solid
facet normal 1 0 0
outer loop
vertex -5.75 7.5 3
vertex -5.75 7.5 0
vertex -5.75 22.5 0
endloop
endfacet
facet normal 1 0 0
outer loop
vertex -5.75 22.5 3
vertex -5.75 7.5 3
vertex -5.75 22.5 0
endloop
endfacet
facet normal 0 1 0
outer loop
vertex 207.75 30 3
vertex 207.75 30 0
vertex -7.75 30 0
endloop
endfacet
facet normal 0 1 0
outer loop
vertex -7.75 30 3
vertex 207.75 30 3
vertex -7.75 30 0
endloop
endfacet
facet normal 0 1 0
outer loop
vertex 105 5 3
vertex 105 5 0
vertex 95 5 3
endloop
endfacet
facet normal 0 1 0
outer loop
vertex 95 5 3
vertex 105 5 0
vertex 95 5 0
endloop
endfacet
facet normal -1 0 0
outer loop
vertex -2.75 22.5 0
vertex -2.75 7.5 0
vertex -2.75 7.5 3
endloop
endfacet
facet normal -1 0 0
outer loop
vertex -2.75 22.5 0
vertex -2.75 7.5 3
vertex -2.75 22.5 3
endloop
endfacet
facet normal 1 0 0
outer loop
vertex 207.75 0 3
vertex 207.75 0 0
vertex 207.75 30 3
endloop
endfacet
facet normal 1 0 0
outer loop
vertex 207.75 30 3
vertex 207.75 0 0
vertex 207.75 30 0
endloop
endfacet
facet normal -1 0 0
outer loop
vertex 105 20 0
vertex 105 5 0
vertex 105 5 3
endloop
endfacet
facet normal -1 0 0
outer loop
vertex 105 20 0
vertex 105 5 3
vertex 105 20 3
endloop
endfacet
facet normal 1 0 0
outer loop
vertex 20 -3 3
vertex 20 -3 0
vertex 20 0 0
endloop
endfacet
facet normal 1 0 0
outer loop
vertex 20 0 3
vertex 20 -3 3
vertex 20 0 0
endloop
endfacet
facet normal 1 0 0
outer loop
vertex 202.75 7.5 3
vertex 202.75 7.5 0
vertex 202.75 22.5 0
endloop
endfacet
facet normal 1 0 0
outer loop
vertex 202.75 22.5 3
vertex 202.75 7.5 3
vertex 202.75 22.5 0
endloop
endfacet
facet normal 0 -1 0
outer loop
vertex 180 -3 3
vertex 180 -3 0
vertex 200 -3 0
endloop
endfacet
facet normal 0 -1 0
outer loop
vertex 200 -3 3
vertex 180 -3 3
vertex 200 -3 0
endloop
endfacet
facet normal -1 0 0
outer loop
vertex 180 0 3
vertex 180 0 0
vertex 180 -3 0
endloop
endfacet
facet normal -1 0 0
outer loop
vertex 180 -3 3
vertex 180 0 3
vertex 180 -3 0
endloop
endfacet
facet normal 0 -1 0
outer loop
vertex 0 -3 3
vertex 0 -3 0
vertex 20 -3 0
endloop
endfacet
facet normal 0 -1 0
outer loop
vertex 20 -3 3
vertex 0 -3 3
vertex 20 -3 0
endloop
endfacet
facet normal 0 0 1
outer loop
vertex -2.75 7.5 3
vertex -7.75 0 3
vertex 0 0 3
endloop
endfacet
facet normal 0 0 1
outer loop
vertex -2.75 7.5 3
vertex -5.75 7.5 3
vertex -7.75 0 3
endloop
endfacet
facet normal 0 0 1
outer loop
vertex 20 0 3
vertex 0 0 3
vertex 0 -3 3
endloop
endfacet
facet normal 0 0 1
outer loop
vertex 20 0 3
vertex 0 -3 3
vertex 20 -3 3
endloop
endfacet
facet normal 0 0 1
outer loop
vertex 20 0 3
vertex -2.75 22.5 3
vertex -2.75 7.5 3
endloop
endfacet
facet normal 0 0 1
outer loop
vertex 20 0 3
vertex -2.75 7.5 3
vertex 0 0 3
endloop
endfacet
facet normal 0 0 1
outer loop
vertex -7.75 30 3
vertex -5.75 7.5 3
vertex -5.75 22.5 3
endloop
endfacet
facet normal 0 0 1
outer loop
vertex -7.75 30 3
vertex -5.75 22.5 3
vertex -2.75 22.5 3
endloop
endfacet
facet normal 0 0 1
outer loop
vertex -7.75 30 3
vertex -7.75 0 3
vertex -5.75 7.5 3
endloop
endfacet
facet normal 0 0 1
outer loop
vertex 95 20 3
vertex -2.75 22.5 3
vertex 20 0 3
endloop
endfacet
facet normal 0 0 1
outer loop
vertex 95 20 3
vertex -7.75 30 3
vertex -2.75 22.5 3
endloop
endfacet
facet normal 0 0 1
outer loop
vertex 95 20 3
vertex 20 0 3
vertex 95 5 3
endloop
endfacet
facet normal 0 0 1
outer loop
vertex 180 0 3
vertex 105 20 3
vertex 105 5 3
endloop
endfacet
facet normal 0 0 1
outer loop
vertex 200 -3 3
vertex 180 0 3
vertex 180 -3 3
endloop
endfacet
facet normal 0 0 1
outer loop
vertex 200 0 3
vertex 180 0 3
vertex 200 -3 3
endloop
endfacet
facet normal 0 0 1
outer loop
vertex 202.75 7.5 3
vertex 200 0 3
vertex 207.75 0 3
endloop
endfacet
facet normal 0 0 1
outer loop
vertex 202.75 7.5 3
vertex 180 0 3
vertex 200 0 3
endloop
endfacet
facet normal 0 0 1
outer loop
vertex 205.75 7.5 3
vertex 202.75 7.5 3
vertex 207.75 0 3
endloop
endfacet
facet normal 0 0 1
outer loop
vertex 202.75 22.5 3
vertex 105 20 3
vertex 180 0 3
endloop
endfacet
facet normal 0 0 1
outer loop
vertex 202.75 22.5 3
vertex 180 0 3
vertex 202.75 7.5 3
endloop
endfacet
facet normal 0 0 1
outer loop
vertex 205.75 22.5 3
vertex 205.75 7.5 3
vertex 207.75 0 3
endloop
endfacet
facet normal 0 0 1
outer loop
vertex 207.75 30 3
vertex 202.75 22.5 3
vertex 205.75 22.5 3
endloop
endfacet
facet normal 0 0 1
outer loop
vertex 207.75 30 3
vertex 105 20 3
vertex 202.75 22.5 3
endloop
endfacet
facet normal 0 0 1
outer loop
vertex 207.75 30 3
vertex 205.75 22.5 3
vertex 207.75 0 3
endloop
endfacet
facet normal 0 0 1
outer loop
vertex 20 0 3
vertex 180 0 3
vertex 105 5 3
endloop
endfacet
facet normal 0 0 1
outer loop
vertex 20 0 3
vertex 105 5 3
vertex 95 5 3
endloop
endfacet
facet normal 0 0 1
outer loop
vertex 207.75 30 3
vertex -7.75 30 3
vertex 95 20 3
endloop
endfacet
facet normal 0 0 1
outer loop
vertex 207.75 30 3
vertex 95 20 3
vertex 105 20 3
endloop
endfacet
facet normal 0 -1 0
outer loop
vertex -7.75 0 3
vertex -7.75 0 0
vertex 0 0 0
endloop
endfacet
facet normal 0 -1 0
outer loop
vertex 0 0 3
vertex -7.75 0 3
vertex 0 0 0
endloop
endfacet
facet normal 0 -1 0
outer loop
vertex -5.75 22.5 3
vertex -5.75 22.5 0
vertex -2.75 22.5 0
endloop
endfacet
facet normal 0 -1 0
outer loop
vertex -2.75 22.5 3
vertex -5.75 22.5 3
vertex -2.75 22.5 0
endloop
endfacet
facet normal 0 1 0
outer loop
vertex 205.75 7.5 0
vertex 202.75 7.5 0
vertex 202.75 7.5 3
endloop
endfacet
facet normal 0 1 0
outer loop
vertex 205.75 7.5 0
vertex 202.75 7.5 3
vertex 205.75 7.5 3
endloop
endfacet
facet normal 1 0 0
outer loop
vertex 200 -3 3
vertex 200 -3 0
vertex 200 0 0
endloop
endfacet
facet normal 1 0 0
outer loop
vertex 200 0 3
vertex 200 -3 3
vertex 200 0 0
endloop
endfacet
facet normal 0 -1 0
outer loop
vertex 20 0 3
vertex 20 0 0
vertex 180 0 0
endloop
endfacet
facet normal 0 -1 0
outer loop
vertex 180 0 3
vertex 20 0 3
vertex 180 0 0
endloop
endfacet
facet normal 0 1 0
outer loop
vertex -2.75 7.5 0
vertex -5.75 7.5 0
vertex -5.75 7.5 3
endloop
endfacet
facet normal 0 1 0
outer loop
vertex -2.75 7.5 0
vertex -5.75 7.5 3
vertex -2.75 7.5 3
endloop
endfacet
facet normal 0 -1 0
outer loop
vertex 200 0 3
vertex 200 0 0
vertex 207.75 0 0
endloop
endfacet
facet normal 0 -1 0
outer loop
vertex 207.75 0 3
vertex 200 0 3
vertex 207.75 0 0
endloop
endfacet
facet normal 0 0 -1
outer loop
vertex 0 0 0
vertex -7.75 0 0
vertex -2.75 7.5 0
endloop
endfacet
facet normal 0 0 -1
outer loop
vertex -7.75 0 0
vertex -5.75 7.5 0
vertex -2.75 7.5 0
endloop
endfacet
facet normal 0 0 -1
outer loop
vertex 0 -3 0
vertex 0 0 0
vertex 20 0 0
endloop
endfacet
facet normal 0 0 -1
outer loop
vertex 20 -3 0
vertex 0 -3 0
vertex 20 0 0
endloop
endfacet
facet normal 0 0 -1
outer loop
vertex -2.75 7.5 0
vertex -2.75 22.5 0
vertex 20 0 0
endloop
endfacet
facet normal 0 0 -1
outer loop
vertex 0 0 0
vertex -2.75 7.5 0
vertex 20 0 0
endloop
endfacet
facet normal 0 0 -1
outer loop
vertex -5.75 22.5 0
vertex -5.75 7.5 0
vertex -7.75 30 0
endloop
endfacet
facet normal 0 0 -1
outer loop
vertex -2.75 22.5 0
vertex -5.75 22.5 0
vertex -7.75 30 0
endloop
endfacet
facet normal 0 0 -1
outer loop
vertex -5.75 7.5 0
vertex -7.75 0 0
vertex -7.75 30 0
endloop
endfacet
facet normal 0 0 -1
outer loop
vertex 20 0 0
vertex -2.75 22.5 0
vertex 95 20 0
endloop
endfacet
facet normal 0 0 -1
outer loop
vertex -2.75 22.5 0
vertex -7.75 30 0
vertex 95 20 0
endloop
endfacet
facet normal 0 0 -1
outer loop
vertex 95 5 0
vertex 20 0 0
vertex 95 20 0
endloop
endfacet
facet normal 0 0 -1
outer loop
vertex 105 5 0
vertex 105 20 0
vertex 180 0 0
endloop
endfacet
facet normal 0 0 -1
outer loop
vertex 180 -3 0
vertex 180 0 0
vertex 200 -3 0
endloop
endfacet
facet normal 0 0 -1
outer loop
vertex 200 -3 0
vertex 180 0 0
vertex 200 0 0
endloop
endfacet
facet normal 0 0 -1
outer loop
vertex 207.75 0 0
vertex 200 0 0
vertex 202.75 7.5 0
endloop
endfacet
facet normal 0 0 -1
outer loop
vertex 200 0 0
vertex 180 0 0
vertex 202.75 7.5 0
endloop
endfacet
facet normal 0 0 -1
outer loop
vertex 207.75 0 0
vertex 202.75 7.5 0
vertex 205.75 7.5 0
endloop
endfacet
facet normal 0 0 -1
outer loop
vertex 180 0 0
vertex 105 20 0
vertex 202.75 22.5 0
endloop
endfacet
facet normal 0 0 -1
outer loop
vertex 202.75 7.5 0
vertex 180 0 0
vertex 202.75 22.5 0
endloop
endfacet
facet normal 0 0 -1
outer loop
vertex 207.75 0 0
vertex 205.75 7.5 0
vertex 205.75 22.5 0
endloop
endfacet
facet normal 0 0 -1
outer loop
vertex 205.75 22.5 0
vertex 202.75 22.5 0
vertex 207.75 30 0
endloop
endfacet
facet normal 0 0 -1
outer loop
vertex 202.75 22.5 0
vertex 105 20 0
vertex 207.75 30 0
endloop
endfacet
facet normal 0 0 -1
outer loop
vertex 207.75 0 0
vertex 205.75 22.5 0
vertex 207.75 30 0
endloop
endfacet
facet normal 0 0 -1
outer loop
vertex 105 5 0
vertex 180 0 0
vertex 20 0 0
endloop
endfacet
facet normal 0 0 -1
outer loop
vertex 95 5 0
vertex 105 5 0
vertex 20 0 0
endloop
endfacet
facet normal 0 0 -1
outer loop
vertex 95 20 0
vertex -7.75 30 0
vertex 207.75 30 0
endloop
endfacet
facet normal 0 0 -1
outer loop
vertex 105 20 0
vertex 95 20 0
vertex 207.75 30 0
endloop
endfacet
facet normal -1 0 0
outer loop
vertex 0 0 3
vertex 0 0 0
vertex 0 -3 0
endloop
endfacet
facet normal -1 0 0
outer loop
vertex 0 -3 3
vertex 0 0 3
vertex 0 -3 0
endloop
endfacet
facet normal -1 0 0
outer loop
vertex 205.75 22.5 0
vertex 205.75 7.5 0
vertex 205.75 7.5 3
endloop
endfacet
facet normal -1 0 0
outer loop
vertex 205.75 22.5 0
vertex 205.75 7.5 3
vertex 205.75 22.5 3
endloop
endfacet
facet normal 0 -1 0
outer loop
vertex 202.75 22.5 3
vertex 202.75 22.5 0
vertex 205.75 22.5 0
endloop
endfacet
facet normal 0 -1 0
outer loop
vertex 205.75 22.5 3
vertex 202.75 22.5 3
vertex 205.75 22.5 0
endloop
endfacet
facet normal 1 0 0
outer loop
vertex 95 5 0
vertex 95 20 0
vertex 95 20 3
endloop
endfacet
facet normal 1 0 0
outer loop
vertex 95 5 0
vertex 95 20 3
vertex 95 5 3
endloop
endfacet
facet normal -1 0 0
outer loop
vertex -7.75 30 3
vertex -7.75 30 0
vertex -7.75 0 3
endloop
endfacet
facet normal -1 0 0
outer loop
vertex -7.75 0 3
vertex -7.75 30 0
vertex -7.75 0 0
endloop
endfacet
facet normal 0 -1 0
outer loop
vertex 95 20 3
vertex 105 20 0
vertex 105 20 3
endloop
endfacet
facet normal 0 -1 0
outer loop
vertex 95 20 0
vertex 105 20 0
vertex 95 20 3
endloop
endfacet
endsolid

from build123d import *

# Parameters (mm, degrees)
SKETCH_1_W      = 3
SKETCH_1_H      = 15
EXTRUDE_1_DEPTH = 3


with BuildPart() as part:
    # 草图1 → 凸台-拉伸1 (new body)
    with BuildSketch(Plane.XY):
        Polygon((20, 0), (180, 0), (180, -3), (200, -3), (200, 0), (202.75, 0), (207.75, 0), (207.75, 30), (202.75, 30), (200, 30), (0, 30), (-2.75, 30), (-7.75, 30), (-7.75, 0), (-2.75, 0), (0, 0), (0, -3), (20, -3), align=None)
        with Locations((204.25, 15)):
            Rectangle(SKETCH_1_W, SKETCH_1_H, mode=Mode.SUBTRACT)
        with Locations((-4.25, 15)):
            Rectangle(SKETCH_1_W, SKETCH_1_H, mode=Mode.SUBTRACT)
        Polygon((100, 5), (105, 5), (105, 20), (95, 20), (95, 5), align=None, mode=Mode.SUBTRACT)
    extrude(amount=EXTRUDE_1_DEPTH)


solid = part.part
